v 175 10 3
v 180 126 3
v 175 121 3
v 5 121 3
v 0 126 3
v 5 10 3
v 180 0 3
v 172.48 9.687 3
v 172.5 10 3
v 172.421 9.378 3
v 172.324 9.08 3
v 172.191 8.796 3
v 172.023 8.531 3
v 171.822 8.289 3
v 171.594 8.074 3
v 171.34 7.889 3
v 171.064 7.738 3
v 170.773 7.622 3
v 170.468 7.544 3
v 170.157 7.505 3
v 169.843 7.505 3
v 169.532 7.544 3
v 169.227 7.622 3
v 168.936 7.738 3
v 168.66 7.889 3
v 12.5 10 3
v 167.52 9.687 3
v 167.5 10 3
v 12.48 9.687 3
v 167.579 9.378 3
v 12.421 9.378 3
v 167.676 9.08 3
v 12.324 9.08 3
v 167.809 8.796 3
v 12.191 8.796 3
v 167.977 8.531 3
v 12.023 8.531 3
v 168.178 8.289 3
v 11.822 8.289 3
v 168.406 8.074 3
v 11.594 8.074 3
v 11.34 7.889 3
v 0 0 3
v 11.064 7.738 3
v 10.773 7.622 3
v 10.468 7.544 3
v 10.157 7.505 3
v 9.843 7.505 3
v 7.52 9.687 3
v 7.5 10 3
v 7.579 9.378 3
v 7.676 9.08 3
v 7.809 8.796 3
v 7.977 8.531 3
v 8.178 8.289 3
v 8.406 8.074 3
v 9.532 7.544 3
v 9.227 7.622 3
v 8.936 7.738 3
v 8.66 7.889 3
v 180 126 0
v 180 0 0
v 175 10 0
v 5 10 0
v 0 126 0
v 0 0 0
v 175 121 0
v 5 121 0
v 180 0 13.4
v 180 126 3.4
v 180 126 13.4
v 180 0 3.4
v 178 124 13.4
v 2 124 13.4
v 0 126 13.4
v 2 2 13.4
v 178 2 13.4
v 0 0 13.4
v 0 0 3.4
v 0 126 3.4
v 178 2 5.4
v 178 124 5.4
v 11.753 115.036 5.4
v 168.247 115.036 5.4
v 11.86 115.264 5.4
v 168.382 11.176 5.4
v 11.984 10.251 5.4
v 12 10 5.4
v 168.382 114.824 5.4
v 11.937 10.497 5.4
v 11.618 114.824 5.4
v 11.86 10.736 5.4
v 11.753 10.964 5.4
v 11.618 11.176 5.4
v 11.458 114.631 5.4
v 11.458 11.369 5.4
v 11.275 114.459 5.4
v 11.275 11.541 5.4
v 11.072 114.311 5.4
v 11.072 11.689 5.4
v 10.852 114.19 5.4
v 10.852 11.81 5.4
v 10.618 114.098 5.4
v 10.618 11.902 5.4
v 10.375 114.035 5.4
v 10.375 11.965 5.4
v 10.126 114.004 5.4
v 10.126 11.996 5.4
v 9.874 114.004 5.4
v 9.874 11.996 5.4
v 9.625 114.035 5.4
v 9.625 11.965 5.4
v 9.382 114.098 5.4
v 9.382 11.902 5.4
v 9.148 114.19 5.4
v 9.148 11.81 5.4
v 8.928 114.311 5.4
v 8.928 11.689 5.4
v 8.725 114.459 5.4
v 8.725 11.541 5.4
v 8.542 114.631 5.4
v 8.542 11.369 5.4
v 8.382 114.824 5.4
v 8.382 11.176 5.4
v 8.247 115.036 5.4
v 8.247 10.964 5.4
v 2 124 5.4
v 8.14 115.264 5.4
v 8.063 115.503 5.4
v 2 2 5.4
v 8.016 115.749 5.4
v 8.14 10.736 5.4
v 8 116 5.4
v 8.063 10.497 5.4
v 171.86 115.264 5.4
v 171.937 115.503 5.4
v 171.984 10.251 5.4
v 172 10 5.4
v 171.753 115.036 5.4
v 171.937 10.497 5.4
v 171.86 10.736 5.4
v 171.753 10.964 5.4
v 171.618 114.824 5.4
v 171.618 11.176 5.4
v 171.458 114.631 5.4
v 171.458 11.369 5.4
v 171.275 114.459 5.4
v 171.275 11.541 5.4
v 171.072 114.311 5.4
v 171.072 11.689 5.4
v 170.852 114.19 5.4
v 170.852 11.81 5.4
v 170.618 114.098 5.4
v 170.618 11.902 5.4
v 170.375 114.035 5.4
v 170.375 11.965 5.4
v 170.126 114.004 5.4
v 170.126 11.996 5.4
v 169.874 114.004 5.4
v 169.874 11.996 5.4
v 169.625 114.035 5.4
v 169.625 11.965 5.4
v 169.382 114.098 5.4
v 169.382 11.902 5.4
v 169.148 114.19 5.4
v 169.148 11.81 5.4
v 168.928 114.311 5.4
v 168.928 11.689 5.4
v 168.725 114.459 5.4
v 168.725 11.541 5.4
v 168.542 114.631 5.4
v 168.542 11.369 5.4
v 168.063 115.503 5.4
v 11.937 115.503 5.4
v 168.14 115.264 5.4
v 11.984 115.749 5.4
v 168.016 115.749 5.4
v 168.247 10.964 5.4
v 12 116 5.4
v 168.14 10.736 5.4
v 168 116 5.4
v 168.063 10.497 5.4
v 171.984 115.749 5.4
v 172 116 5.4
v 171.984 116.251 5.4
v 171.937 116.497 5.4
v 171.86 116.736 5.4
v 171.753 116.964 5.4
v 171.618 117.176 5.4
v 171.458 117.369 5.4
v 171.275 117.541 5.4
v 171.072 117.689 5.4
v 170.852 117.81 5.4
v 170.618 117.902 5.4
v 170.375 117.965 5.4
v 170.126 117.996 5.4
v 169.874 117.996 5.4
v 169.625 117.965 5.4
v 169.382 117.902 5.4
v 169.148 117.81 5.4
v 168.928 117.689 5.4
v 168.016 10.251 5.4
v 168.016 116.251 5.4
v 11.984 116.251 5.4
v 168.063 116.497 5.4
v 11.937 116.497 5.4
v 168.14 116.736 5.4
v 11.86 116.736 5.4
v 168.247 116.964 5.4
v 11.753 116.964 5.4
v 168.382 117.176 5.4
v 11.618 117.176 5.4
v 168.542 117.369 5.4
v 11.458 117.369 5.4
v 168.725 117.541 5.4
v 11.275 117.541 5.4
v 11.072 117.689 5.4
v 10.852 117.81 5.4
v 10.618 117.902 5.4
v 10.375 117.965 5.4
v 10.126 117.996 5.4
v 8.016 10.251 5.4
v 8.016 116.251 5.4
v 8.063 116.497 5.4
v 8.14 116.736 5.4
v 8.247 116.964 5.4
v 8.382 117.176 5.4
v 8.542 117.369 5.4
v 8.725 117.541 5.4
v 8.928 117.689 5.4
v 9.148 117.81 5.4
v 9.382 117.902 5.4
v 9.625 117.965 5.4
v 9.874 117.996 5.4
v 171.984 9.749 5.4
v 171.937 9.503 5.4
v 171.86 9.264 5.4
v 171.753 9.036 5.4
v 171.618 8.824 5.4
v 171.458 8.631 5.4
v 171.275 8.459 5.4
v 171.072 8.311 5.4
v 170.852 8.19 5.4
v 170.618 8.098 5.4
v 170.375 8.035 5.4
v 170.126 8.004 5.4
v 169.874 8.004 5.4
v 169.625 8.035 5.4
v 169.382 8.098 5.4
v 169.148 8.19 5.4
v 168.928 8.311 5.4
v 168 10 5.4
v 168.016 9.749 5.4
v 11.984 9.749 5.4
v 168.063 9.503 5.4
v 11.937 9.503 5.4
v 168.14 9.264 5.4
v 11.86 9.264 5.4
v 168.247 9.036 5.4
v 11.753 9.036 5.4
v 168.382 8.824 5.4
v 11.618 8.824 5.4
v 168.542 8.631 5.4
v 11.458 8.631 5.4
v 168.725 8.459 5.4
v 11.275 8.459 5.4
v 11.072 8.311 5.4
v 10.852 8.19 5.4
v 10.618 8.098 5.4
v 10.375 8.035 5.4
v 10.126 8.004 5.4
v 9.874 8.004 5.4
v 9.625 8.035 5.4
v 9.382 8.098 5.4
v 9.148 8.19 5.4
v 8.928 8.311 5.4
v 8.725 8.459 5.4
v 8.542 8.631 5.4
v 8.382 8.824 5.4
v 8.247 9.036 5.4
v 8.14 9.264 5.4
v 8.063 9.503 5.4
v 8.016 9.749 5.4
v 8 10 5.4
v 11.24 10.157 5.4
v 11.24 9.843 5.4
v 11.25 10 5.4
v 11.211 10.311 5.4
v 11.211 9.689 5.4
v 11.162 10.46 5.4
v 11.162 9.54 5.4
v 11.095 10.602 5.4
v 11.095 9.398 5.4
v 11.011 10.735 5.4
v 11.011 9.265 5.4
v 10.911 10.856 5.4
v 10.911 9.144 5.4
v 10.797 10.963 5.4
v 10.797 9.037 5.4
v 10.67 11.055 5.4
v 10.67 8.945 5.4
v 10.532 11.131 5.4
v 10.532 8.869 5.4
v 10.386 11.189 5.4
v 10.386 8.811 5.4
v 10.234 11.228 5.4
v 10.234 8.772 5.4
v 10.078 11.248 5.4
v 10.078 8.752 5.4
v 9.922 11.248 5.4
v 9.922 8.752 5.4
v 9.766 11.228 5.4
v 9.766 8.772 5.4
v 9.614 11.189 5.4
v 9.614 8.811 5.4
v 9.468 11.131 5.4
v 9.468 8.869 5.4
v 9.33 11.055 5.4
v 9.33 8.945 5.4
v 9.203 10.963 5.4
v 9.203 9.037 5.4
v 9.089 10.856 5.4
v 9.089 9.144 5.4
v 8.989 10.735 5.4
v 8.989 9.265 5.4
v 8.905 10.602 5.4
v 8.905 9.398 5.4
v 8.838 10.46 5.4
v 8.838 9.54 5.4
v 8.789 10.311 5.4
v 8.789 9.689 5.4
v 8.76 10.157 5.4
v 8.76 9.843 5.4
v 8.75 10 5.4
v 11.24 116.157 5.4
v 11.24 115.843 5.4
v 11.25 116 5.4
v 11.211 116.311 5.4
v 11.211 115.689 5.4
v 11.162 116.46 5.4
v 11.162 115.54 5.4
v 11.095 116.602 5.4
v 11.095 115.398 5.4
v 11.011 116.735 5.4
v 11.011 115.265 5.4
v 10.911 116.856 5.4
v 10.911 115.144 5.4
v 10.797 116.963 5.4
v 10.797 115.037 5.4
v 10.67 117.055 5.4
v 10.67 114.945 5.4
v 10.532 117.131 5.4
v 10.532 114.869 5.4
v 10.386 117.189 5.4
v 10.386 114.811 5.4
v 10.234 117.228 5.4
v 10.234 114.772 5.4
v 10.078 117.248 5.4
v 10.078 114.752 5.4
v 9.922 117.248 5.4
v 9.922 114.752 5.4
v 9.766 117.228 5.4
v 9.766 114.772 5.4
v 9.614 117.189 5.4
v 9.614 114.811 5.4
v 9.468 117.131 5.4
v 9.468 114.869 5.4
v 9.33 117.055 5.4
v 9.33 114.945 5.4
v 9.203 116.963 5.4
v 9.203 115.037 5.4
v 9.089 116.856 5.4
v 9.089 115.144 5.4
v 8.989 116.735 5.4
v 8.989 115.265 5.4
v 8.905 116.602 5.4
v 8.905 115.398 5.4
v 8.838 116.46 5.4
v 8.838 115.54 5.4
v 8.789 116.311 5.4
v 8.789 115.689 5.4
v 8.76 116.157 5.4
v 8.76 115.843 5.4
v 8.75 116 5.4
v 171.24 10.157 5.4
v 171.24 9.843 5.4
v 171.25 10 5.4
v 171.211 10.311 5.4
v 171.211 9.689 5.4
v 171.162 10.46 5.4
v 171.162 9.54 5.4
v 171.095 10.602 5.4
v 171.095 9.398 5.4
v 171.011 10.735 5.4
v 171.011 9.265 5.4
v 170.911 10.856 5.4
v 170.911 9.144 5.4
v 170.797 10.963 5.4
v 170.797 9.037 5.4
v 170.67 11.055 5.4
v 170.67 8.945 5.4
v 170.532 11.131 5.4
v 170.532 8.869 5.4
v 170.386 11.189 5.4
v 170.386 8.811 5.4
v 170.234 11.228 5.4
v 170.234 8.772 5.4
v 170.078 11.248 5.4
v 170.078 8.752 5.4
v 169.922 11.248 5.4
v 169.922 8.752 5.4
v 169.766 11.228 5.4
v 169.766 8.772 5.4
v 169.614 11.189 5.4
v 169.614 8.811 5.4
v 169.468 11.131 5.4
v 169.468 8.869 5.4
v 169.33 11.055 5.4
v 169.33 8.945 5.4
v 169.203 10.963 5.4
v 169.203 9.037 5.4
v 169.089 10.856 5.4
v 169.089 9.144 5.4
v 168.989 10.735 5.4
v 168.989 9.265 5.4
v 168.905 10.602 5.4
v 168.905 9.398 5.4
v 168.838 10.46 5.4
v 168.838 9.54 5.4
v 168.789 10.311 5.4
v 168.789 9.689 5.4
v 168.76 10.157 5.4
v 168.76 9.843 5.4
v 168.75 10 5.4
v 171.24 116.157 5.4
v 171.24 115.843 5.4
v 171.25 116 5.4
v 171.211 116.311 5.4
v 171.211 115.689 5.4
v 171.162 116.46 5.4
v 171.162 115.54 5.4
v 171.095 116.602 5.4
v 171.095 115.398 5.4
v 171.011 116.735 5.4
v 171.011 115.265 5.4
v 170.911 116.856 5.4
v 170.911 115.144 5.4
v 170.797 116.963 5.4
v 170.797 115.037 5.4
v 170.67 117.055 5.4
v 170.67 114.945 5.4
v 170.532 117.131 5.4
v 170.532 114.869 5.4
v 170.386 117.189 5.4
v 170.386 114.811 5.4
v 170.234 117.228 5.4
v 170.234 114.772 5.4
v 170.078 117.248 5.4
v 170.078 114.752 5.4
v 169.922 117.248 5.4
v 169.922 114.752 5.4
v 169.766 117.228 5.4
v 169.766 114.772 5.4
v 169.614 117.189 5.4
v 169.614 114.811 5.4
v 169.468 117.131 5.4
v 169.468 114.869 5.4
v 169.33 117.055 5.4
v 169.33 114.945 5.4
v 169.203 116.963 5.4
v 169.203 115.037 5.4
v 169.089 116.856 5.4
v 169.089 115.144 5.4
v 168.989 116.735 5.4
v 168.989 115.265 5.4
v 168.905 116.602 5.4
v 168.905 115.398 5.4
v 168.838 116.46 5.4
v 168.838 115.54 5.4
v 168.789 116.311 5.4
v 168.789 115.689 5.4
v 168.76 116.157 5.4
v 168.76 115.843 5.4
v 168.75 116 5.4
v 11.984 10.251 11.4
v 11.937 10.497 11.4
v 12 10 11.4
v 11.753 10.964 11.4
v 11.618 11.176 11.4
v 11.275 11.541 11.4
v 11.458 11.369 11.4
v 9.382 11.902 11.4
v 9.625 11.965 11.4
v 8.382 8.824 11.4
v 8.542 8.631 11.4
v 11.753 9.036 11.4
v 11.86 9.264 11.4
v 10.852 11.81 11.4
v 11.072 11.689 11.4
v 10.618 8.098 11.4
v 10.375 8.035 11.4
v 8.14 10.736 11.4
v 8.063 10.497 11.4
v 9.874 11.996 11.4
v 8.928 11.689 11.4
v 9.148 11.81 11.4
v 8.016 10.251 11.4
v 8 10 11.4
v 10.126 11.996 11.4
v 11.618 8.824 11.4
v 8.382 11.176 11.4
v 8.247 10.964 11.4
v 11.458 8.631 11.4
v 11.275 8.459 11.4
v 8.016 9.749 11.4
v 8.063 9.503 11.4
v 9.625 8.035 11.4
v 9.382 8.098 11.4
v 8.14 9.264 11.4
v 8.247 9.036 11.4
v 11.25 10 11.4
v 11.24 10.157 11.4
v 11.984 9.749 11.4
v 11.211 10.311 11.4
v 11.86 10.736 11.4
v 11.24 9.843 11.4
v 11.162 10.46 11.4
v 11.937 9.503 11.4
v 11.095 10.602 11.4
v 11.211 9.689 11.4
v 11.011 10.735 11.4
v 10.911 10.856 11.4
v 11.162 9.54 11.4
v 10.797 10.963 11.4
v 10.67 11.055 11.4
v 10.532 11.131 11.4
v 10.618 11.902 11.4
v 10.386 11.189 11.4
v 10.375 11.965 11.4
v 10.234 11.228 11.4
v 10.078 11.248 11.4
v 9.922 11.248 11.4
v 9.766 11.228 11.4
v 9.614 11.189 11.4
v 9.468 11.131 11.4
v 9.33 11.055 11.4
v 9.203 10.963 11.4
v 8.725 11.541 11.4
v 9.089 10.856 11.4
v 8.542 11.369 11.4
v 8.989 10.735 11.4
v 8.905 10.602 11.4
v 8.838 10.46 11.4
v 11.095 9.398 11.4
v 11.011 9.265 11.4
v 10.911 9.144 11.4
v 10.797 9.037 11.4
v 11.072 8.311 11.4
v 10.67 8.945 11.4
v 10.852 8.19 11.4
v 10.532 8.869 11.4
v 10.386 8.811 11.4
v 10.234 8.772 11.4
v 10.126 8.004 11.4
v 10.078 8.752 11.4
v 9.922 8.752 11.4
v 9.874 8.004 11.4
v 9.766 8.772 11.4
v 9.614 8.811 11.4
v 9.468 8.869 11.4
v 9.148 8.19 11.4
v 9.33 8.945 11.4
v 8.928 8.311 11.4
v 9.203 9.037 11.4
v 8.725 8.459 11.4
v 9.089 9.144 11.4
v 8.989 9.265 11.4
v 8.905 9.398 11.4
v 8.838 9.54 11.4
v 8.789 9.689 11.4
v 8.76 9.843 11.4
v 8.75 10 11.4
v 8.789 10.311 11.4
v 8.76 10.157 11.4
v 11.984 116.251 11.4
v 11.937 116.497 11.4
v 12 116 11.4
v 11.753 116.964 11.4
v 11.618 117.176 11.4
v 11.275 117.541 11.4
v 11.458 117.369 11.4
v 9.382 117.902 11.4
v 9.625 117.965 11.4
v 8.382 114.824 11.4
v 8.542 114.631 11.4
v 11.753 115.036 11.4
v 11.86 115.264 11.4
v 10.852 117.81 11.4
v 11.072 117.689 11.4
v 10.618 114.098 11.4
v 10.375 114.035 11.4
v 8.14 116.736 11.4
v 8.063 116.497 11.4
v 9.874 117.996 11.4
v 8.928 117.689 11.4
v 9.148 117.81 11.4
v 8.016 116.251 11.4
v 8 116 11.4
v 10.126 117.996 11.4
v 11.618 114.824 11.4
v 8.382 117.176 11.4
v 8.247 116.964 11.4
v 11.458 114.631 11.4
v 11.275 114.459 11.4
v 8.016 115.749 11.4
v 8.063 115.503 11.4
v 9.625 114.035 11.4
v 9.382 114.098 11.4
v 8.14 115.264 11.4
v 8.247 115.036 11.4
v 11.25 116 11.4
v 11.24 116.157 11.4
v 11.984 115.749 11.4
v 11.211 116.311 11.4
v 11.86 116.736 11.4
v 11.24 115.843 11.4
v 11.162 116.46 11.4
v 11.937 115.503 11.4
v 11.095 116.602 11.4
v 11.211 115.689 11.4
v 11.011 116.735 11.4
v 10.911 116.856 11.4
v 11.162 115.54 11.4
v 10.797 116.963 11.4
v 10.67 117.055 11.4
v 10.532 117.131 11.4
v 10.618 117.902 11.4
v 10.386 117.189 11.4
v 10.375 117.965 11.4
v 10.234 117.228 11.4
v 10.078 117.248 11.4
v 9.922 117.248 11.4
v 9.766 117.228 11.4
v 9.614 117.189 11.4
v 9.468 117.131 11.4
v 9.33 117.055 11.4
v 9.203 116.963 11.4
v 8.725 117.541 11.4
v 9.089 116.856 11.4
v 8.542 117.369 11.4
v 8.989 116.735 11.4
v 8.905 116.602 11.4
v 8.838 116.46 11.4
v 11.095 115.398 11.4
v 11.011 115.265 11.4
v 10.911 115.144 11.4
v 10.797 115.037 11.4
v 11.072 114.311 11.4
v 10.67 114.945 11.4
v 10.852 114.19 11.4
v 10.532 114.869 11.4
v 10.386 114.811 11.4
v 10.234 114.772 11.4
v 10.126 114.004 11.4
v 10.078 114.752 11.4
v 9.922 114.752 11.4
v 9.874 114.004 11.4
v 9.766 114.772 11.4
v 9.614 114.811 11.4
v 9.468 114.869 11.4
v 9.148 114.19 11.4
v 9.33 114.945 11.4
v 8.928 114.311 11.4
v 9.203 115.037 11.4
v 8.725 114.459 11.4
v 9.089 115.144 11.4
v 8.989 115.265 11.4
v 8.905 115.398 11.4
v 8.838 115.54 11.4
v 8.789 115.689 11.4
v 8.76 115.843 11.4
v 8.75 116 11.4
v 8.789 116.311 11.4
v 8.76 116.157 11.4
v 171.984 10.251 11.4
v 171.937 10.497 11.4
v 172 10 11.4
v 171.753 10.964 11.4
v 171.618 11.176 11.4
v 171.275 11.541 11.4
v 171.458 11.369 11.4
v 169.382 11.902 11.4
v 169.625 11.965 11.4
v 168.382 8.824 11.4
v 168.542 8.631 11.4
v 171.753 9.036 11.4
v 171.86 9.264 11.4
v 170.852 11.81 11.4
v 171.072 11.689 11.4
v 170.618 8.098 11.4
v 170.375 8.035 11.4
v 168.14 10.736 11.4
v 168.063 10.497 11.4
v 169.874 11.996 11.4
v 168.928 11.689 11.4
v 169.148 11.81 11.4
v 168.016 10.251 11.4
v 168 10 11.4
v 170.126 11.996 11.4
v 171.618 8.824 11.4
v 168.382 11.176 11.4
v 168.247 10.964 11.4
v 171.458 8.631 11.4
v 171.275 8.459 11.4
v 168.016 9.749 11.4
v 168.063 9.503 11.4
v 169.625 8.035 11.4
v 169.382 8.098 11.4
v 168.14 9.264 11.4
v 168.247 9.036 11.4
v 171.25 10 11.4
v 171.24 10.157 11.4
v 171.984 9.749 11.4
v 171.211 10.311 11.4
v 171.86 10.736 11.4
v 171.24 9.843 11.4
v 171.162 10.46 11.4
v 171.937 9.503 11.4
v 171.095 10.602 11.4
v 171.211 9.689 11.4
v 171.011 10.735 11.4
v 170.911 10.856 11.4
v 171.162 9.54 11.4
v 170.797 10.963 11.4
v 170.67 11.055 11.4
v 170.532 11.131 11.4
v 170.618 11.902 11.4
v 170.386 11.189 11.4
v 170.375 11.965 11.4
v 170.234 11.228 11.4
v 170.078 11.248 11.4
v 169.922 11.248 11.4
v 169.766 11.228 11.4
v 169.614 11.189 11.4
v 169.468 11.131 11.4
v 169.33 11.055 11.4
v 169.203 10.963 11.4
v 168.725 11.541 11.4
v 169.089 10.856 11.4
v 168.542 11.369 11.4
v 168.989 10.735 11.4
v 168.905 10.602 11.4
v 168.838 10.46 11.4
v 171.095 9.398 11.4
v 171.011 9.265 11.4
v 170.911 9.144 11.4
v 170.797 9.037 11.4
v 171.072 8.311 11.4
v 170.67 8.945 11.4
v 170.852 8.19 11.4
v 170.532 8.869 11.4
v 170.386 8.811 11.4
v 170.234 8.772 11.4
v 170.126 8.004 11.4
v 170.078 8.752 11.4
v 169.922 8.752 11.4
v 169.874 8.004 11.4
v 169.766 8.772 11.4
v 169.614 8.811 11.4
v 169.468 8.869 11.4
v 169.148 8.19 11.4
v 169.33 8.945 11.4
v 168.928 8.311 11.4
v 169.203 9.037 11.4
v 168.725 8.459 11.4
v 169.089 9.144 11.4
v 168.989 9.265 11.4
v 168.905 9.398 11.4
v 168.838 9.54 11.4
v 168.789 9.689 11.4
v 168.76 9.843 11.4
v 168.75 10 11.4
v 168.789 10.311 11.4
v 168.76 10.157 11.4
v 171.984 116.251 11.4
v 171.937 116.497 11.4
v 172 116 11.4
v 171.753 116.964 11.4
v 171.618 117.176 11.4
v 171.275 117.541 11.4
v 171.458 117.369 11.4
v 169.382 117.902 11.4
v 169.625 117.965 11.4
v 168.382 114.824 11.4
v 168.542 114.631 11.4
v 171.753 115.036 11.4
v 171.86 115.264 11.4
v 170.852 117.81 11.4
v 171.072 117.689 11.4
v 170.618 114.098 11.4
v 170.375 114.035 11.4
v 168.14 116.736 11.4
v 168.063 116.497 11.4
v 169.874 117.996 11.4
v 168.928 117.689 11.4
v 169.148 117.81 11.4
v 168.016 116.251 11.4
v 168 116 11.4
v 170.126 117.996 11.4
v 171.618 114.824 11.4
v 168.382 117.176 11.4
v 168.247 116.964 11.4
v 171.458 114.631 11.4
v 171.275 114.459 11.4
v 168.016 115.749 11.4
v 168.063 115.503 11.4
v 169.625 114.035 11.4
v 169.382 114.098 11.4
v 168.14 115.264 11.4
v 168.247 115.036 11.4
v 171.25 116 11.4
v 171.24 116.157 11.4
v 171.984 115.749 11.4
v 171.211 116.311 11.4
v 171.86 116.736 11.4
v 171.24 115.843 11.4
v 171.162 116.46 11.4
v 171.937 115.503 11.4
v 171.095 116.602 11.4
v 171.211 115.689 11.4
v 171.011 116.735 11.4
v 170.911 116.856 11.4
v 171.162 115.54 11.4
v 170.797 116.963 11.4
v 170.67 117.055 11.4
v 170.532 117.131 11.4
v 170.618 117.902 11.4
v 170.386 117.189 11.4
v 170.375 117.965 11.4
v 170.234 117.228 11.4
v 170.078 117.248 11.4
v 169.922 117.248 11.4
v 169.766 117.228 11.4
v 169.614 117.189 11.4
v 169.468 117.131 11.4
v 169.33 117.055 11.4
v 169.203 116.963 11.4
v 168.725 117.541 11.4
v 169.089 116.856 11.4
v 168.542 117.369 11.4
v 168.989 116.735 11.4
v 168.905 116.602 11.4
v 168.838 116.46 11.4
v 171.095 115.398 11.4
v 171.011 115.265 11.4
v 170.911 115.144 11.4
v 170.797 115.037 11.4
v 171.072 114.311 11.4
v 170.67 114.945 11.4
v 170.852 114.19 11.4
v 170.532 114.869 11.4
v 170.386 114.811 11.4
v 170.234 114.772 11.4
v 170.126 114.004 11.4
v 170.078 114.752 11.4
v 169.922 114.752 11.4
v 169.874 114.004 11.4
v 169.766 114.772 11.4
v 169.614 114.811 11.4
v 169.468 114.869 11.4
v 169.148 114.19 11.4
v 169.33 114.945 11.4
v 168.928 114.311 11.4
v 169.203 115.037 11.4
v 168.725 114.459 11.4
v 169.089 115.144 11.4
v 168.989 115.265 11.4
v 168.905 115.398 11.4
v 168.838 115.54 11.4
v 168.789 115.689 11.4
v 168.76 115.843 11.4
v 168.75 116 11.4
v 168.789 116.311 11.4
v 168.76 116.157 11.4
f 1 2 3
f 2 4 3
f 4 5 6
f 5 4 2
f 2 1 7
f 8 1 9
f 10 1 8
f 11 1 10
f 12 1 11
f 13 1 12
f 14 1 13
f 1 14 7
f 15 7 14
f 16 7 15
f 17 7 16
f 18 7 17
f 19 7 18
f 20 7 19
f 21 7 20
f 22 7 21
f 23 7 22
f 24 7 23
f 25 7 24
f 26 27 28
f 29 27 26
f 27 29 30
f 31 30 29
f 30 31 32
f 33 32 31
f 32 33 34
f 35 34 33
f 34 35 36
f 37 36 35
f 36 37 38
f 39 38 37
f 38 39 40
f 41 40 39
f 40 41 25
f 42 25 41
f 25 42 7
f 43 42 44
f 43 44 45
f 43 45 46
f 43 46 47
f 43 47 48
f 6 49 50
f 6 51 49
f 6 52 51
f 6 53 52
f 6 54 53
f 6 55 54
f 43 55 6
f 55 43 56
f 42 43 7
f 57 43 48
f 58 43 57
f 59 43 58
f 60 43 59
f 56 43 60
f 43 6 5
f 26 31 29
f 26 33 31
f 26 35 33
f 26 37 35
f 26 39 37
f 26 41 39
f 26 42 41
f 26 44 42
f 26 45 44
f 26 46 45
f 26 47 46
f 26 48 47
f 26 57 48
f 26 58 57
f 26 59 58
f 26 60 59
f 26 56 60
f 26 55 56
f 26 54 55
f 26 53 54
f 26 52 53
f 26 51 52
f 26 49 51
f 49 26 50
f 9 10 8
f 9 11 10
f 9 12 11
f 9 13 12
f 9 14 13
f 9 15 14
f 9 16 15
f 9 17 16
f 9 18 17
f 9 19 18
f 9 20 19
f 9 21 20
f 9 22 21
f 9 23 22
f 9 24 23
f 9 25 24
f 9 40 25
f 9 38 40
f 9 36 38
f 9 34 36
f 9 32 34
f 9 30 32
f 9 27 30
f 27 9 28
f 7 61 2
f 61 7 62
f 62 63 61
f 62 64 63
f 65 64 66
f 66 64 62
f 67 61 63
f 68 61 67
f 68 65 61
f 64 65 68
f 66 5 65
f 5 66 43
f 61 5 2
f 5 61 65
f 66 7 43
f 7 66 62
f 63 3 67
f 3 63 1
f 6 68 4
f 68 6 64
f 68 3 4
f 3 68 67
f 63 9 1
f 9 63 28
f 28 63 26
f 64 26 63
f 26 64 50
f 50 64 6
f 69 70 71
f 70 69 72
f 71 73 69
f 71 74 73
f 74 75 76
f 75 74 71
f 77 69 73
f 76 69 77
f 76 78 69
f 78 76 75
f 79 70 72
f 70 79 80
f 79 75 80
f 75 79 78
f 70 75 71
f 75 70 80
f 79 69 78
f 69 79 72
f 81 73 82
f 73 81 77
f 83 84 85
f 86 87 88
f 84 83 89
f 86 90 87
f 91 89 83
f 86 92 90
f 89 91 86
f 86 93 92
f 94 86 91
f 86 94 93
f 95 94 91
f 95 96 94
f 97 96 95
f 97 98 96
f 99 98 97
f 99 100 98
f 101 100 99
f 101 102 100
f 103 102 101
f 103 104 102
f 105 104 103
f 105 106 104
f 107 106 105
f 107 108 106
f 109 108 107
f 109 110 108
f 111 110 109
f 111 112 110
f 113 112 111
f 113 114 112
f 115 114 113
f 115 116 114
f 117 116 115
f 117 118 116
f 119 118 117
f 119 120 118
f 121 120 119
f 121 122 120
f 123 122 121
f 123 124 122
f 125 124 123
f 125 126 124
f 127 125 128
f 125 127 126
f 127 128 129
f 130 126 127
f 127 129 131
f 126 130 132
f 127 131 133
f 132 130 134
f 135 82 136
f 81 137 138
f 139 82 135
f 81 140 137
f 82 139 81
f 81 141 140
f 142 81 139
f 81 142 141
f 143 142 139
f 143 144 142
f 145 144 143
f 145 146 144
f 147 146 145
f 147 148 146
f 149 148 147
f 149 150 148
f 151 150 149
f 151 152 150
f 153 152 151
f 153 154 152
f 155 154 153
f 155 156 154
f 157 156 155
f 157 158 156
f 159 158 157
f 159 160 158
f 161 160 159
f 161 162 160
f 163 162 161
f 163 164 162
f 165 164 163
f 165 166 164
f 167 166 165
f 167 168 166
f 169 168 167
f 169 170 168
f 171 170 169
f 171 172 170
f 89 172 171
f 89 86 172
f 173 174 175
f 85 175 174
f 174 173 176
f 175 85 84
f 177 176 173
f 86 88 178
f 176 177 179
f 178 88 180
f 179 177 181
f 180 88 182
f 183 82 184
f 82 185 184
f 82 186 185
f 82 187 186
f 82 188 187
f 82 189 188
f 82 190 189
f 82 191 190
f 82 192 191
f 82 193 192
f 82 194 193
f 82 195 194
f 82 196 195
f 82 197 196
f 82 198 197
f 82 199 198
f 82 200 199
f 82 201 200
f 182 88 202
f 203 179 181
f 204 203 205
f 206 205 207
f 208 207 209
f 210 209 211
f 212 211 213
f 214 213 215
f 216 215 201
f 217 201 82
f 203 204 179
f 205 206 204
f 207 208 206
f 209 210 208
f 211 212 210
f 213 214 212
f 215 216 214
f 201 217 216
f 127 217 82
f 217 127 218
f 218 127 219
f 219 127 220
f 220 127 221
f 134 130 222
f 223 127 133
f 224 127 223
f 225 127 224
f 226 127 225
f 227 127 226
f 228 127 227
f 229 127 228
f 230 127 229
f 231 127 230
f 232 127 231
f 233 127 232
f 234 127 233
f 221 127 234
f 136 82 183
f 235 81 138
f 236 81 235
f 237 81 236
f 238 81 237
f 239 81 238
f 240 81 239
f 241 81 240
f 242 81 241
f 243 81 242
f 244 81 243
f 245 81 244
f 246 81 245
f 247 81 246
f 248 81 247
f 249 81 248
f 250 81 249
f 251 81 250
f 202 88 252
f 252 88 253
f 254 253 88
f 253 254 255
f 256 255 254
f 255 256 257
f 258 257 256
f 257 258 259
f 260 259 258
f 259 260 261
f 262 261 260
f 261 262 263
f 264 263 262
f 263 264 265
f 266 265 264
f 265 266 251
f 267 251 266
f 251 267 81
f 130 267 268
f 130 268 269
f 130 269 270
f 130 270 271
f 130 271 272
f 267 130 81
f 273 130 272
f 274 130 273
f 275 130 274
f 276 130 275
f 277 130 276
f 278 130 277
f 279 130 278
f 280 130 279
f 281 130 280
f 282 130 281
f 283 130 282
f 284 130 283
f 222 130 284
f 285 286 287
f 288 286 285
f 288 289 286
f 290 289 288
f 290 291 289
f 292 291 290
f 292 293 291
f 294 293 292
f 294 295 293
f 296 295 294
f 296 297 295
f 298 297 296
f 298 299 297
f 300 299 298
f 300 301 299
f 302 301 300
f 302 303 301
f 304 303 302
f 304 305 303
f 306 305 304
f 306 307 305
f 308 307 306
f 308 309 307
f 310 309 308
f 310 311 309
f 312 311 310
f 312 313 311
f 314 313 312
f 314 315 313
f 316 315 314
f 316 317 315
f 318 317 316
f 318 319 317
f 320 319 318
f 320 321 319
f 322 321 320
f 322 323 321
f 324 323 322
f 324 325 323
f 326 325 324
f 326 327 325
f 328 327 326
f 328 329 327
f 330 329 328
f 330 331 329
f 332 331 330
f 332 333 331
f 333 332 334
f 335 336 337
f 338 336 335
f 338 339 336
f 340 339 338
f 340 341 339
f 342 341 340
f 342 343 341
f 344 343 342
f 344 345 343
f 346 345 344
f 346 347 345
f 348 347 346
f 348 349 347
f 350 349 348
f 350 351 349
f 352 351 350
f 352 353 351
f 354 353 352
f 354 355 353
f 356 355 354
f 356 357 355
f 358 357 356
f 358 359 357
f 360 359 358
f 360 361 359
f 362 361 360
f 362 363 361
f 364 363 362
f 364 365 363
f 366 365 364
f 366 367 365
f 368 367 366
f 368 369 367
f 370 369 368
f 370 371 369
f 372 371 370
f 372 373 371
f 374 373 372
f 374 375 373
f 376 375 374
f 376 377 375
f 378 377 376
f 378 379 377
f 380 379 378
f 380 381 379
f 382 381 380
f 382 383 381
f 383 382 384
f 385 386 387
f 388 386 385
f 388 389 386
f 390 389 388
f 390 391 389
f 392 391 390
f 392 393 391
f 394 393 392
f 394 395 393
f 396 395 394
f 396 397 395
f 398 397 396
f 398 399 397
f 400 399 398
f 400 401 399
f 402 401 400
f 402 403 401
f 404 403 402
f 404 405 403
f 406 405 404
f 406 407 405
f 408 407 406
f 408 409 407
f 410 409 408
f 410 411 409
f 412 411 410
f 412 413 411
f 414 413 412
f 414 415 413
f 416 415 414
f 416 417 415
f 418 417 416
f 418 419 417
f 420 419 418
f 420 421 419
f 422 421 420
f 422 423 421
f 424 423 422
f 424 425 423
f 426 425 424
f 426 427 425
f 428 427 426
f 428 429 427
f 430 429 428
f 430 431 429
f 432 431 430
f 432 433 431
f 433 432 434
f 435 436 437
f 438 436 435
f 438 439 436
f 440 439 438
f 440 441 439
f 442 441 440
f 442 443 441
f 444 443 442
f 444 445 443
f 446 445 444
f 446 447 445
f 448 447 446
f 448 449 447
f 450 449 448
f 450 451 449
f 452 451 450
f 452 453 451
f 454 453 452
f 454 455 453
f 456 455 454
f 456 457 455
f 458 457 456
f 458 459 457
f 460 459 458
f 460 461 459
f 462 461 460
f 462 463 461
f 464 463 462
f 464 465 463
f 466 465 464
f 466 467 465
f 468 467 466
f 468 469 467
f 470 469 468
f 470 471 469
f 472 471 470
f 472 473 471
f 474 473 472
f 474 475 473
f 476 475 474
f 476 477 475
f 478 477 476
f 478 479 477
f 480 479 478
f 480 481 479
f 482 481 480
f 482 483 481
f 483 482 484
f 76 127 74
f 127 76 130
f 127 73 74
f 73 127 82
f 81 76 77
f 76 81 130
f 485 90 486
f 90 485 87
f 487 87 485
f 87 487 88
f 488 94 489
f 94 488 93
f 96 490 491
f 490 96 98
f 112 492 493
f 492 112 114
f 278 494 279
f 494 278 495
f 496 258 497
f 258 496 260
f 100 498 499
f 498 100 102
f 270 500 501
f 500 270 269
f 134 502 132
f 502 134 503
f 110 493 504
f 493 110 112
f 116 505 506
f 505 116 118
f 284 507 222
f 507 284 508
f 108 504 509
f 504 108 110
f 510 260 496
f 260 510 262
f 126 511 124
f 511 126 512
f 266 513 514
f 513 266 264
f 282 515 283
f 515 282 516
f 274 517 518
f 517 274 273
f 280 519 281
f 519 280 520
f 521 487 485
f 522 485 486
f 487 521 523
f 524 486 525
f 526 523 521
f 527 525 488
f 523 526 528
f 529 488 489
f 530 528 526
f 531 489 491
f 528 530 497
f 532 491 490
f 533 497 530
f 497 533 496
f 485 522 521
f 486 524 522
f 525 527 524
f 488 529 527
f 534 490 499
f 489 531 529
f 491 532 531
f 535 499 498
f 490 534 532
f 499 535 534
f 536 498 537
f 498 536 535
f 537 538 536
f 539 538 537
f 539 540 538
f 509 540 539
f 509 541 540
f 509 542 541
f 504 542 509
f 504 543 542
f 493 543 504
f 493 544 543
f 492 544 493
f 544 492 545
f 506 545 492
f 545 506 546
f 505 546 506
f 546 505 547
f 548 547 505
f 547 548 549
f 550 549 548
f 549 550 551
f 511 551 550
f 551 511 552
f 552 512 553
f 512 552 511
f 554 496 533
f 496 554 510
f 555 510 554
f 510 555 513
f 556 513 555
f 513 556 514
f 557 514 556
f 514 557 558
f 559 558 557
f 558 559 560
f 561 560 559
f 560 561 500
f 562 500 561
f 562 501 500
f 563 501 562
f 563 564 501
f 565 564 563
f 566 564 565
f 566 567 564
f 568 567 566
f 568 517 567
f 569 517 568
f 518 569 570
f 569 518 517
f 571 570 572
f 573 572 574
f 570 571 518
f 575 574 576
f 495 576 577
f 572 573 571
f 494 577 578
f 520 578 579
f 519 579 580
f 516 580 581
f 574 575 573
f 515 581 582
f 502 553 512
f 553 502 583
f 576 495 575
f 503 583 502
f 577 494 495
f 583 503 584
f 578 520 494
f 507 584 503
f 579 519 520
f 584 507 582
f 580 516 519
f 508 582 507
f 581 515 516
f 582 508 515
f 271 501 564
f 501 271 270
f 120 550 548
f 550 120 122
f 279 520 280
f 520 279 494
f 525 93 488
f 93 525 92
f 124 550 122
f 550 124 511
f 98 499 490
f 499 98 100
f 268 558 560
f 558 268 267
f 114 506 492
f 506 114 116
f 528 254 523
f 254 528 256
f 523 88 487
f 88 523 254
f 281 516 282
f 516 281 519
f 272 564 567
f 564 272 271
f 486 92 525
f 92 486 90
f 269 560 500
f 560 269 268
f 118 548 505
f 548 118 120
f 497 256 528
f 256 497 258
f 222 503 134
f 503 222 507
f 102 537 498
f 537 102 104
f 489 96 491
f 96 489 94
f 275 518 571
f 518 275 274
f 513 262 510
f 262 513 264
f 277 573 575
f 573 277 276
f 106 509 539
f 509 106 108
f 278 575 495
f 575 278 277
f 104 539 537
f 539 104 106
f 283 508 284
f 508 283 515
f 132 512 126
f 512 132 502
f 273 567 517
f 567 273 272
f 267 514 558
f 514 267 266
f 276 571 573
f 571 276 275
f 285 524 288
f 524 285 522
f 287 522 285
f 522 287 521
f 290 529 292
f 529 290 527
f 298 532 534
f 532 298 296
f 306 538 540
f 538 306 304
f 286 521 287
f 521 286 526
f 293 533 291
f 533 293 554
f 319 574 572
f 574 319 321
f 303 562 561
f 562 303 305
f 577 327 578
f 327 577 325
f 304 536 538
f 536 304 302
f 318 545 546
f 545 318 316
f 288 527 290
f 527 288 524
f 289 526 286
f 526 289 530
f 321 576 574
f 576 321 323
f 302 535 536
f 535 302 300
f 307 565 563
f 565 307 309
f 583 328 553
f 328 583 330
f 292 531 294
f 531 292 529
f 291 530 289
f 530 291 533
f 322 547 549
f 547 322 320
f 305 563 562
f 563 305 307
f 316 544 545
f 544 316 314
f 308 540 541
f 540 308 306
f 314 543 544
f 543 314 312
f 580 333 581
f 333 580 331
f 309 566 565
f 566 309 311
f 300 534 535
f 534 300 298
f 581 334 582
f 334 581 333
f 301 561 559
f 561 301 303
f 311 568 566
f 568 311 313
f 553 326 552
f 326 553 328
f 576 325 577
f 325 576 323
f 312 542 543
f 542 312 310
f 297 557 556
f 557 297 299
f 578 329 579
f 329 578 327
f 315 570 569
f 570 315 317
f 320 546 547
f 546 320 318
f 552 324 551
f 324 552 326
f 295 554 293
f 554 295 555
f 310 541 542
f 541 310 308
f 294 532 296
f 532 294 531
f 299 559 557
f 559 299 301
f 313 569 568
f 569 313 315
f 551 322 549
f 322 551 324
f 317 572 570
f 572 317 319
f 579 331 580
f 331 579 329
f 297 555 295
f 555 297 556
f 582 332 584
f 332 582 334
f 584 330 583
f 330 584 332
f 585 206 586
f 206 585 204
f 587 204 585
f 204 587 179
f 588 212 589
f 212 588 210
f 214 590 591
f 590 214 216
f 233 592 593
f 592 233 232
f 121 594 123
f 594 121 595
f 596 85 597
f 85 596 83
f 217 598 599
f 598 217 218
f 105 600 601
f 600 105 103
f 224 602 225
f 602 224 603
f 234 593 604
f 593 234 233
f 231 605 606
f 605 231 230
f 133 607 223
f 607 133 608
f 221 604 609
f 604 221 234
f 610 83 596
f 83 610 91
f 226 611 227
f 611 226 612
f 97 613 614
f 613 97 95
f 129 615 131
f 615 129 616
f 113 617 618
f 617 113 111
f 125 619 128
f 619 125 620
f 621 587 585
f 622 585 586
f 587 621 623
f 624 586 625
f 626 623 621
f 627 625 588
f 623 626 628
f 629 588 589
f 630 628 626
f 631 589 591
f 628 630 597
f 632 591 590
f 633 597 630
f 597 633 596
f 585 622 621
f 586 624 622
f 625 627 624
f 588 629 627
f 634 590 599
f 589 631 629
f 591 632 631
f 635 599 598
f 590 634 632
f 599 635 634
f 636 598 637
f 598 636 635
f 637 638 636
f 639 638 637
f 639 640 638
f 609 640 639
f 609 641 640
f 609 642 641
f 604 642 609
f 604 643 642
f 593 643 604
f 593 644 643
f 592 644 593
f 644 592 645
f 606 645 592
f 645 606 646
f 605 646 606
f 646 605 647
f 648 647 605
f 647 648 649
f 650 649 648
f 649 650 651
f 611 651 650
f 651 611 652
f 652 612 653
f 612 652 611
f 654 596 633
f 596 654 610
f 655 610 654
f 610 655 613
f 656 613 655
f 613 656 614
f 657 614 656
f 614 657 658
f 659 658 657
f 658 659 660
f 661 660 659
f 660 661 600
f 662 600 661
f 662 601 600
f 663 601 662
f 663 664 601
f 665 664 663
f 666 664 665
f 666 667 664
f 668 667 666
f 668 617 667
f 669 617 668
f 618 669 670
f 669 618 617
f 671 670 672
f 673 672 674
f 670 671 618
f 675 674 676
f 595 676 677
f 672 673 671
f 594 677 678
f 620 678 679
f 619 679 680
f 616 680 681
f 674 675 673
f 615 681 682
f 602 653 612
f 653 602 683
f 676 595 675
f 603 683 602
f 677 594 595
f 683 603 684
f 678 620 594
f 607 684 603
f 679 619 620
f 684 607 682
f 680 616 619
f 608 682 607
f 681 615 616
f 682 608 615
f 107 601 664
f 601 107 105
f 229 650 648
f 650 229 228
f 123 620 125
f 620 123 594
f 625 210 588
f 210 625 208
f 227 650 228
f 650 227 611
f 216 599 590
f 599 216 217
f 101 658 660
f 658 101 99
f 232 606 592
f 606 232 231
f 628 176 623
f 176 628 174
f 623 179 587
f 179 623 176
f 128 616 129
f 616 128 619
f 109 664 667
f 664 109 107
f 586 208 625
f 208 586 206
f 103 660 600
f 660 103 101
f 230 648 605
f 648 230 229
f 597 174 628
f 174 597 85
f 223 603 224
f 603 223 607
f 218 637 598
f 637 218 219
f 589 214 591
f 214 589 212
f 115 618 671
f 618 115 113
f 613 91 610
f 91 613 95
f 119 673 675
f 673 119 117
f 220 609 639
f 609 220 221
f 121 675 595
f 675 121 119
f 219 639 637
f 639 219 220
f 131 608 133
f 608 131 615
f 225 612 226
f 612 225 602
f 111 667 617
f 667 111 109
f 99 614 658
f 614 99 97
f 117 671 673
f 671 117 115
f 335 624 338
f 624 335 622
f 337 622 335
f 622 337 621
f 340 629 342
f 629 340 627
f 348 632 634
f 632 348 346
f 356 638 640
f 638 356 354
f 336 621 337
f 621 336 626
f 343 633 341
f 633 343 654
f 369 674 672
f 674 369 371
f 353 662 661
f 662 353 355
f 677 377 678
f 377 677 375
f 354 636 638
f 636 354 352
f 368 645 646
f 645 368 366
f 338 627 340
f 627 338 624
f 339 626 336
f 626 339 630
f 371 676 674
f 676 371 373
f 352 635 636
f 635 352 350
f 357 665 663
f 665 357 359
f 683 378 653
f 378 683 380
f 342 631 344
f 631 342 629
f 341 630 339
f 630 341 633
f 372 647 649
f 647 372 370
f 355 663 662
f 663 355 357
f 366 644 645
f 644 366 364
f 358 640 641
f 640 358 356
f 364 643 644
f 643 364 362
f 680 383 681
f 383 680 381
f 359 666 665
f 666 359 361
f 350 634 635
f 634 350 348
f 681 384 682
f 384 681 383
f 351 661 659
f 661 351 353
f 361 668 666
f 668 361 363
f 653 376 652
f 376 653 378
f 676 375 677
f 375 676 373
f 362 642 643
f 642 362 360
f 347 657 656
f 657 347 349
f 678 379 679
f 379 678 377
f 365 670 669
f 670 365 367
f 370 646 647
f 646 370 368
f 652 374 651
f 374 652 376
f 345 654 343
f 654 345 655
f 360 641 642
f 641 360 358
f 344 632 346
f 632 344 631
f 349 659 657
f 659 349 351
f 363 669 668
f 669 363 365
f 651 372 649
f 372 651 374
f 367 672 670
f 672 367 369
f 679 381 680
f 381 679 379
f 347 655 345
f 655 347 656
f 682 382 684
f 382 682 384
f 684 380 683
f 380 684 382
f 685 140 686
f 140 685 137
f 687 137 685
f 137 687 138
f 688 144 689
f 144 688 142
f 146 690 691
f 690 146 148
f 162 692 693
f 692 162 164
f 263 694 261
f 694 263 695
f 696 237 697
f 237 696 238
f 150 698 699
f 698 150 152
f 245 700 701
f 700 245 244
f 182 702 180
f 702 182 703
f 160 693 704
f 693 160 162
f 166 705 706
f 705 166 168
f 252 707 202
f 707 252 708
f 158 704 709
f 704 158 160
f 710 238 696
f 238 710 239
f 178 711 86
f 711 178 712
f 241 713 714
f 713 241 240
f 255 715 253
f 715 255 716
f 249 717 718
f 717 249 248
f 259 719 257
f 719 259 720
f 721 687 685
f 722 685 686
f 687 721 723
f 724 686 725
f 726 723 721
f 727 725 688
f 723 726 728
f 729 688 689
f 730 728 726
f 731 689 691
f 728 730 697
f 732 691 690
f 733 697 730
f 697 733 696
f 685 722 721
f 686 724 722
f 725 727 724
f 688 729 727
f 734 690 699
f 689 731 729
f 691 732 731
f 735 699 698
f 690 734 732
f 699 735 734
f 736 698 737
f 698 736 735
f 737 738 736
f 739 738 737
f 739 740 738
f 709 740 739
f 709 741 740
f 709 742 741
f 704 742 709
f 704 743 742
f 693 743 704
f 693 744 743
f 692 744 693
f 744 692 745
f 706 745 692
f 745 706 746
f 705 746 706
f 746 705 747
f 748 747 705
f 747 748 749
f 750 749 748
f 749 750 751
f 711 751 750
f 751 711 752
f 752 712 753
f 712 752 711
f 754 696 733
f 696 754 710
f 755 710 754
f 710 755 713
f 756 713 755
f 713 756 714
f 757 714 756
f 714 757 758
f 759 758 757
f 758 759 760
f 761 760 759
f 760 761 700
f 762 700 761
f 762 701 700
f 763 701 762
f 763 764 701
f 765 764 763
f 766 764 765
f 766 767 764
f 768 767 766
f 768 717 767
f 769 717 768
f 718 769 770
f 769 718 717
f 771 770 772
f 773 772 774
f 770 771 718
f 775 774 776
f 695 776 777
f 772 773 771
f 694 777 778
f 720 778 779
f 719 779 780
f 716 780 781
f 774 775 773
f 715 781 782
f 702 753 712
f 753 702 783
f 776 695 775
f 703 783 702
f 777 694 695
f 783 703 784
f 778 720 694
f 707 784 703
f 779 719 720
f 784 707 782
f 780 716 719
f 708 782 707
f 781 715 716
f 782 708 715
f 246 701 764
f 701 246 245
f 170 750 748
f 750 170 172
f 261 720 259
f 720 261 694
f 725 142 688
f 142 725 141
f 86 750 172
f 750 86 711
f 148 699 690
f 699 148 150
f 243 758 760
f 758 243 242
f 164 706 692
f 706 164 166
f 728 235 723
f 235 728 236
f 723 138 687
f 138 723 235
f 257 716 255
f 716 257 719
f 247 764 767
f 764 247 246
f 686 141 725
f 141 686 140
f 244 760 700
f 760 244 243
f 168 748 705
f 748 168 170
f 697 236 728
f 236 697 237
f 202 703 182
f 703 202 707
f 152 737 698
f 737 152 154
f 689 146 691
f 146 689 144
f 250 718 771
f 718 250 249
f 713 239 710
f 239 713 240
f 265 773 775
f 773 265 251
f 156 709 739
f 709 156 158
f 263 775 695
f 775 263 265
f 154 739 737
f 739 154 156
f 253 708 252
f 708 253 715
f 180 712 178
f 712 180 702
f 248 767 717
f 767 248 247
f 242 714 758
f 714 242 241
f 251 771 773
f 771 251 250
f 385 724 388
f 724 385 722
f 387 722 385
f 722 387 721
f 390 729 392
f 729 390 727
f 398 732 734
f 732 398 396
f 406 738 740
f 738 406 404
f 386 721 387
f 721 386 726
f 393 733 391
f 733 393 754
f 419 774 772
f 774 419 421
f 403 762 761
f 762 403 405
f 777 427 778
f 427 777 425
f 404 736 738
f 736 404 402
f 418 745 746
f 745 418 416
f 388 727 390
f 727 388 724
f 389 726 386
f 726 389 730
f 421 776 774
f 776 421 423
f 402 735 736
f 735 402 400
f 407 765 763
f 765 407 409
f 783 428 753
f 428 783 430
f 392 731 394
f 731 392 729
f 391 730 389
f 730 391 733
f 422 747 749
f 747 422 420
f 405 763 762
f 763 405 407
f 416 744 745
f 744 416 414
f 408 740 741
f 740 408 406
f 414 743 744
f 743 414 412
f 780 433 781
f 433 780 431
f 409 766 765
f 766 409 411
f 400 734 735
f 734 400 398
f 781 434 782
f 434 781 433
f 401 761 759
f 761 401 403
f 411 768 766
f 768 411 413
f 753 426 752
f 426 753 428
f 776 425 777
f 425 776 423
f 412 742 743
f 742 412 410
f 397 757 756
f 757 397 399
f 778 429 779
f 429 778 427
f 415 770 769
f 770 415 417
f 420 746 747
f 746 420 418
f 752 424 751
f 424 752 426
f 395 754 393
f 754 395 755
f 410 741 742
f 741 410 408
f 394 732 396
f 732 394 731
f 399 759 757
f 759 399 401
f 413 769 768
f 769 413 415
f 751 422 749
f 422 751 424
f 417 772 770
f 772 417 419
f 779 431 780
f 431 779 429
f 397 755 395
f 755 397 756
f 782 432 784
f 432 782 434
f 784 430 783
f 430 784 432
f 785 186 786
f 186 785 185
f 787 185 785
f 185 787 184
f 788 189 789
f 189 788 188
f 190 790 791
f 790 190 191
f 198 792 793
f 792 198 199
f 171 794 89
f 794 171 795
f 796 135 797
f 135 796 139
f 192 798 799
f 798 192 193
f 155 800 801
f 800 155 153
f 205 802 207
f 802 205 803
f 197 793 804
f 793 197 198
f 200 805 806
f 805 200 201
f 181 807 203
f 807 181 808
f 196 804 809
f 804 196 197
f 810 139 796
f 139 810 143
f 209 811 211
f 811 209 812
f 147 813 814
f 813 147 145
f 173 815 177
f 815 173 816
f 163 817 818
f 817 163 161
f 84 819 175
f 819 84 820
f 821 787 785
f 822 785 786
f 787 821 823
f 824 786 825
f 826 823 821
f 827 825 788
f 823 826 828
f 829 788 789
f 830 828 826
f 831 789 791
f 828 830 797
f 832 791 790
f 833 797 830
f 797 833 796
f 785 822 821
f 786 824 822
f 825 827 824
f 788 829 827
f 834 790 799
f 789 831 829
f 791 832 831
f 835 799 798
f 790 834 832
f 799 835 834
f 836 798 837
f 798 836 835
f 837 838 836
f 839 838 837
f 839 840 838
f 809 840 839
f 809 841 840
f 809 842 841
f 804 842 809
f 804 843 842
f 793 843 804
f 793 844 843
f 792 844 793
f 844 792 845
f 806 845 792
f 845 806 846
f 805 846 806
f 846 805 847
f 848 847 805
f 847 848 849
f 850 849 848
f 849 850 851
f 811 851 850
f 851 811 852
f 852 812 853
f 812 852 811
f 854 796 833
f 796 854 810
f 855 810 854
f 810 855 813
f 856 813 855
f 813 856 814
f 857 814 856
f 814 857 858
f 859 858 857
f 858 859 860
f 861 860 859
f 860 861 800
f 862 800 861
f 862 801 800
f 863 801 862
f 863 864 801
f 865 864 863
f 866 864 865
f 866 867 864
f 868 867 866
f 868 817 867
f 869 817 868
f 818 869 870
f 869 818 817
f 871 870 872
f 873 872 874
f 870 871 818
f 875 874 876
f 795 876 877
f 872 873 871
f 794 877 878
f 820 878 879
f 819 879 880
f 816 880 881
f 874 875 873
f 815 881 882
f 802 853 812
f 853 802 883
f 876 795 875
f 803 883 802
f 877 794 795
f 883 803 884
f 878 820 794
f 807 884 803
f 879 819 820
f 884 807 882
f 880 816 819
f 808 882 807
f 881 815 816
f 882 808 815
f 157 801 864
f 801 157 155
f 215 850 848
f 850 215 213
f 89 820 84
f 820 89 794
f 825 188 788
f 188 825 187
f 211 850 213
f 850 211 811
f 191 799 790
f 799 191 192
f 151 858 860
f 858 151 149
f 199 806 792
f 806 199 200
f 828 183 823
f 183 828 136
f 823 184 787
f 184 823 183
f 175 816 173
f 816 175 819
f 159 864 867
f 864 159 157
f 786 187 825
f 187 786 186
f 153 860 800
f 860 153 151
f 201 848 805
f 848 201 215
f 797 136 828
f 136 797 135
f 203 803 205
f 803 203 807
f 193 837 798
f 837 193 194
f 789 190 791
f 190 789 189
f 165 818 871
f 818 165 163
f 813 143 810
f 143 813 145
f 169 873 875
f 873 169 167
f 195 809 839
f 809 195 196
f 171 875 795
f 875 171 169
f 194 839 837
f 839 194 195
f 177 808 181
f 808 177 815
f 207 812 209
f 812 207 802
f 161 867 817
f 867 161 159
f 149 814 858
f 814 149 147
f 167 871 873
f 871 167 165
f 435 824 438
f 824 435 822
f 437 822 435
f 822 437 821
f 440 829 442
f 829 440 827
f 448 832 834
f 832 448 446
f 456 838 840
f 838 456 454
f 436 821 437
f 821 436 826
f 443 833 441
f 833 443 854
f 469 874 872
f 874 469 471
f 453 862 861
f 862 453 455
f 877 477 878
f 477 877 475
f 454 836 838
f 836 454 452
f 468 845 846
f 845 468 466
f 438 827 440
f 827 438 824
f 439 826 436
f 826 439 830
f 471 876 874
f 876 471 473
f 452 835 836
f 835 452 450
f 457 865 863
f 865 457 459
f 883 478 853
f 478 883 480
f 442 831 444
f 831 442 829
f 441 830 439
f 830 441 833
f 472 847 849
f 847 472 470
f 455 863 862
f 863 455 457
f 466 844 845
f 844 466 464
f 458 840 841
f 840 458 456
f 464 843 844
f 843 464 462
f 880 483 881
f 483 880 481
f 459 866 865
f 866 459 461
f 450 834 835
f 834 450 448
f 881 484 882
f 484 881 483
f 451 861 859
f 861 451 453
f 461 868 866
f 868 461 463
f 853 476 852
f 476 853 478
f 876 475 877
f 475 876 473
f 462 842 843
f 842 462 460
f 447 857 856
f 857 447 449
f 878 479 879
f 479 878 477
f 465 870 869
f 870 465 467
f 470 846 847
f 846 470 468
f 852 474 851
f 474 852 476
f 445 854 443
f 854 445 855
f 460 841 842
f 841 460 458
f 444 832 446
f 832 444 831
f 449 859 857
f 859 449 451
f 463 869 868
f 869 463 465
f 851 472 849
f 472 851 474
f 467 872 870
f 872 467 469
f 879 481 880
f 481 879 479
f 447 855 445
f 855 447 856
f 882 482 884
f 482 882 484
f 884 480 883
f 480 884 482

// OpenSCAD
///////////////////////////////////////////////////////////////////////
//  E-Ink Display Case
//  Parametric Case for 7.3" Waveshare E-Ink & Raspberry Pi Zero W2
//
//  Author: ChatGPT (inspired by snippet provided by @Andy Levesque)
//  License: CC BY-NC
//
//  Description:
//    This OpenSCAD file creates a two- (or three-) part enclosure:
//    1) A front frame that holds and bezel-encapsulates the eInk panel
//    2) A back shell to hold Pi Zero W2 and to secure the panel from behind
//    3) Optionally a middle spacer if you need more depth or want a 3-part approach
//
//  Key features:
//    - Parametric eInk display size (width x height)
//    - Different top/bottom/left/right bezel widths
//    - Extensions for each bezel dimension
//    - Screw standoffs for assembly
//    - Adjust thickness, standoff heights/diameters, etc.
//
//  Usage:
//    1) Tweak parameters below
//    2) Render the entire assembly or generate STLs for each part:
//       - "front_frame()"
//       - "back_shell()"
//       - "middle_spacer()" (optional if you’d like more depth)
//    3) Export each module as STL individually or comment/uncomment
//       to see only the part you want.
//
//  NOTE: If you want to incorporate your original code’s hex walls,
//        slot system, or BOSL2-based features, simply replace the
//        relevant geometry inside the union/difference blocks with
//        your specialized modules.
///////////////////////////////////////////////////////////////////////


// -------------------------------------------------------------------
//                        1) Core Dimensions
// -------------------------------------------------------------------

// 7.3" Waveshare eInk active area ~170 x 111 mm. 
// Adjust to your panel’s outer glass or frame dimensions, if needed.
eInkWidth  = 170;     // mm
eInkHeight = 111;     // mm

// Bezel thickness on each side. By default, 5 mm all around except bottom is 10 mm.
bezelTop    = 5;
bezelBottom = 10;
bezelLeft   = 5;
bezelRight  = 5;

// Optional extension in each direction beyond the bezel. 
// Useful if you want more room for cables or to attach stands, etc.
extendTop    = 0;
extendBottom = 0;
extendLeft   = 0;
extendRight  = 0;

// The front frame thickness and the back shell thickness
frameThickness   = 3;   // how “tall” the front bezel ring is
backShellDepth   = 8;   // interior depth behind the panel for Pi, wires, etc.
shellWallThickness = 2; // thickness of the back shell walls

// If you want a separate "middle spacer" piece to further extend the case:
middleSpacerHeight = 0;  // set > 0 for a 3-part case, set 0 to omit

// -------------------------------------------------------------------
//                      2) Mounting / Screws
// -------------------------------------------------------------------

// Screw standoff settings
standoffDiameter        = 4.0;      // outer diameter of standoff
screwHoleDiameter       = 2.5;      // clearance hole for M2.5 or M3, etc.
standoffHeight          = backShellDepth; 
standoffInsetFromEdges  = 10;       // how far from edges to place standoffs

// The front ring also can have “receptacles” that line up with standoffs
receptacleDepth   = 2;  // how deep the front ring’s countersink for the screw
receptacleDiameter = 5; // slightly bigger than standoffDiameter to hold the head

// Number of standoffs along width/height
standoffCountWidth  = 2;  // how many standoffs left-to-right
standoffCountHeight = 2;  // how many standoffs top-to-bottom

// -------------------------------------------------------------------
//                 3) Calculate Overall Dimensions
// -------------------------------------------------------------------

// The overall opening needed for the eInk panel
panelWidth  = eInkWidth;
panelHeight = eInkHeight;

// The front frame’s total X dimension
totalFrameX = panelWidth
             + bezelLeft + bezelRight
             + extendLeft + extendRight;

// The front frame’s total Y dimension
totalFrameY = panelHeight
             + bezelTop + bezelBottom
             + extendTop + extendBottom;

// The front frame’s outer X dimension == totalFrameX
// The front frame’s outer Y dimension == totalFrameY
// The front frame’s thickness == frameThickness

// If you are doing a 3-part design, total case depth = frameThickness + middleSpacerHeight + backShellDepth + shellWallThickness

// -------------------------------------------------------------------
//              4) Modules for repeated geometry
// -------------------------------------------------------------------

// Create a rounded or standard rectangular cuboid
module box_3d(sizeXYZ=[10,10,10], center=false) {
    // Simple standard box
    if (!center) {
        cube(sizeXYZ, center=false);
    } else {
        cube(sizeXYZ, center=true);
    }
}

// A simple standoff plus a hole for screw
module standoffWithHole(height, standoffDia, holeDia) {
    difference() {
        cylinder(h = height, r = standoffDia/2, $fn=50);
        translate([0,0,-0.1])  // slight shift so hole goes all the way
            cylinder(h = height+0.2, r = holeDia/2, $fn=50);
    }
}

// Discrete function to place standoffs in corners or along edges
module placeStandoffs(standoffHt, standoffDia, holeDia, standoffCntW, standoffCntH) {
    // We’ll distribute them across the “inner rectangle”
    // from standoffInsetFromEdges to (totalFrameX - standoffInsetFromEdges)
    spacingW = (totalFrameX - 2*standoffInsetFromEdges);
    spacingH = (totalFrameY - 2*standoffInsetFromEdges);

    // If standoffCountWidth == 2, we place them at each corner in X
    // If standoffCountWidth > 2, we spread them evenly
    stepW = (standoffCountWidth > 1) 
            ? spacingW / (standoffCountWidth - 1) 
            : 0;
    stepH = (standoffCountHeight > 1)
            ? spacingH / (standoffCountHeight - 1)
            : 0;
    
    for (ix=[0:standoffCountWidth-1]) {
        for (iy=[0:standoffCountHeight-1]) {
            xPos = standoffInsetFromEdges + ix * stepW;
            yPos = standoffInsetFromEdges + iy * stepH;
            // Move standoff into place
            translate([xPos, yPos, 0])
                standoffWithHole(standoffHt, standoffDia, holeDia);
        }
    }
}

// A cutout for the eInk panel region
module eInkCutout() {
    // The panel sits flush inside
    // We remove a rectangle from the front frame. 
    translate([bezelLeft + extendLeft, 
               bezelBottom + extendBottom, 
               0])
        cube([panelWidth, panelHeight, 999], center=false);
}

// -------------------------------------------------------------------
//             5) The Front Frame (Top Part)
// -------------------------------------------------------------------
module front_frame() {
    // This ring is totalFrameX x totalFrameY, thickness = frameThickness
    // With a large rectangular cutout for the display

    difference() {
        // Outer shape of front frame
        box_3d(
            sizeXYZ=[totalFrameX, totalFrameY, frameThickness],
            center=false
        );
        
        // Carve out the display opening
        eInkCutout();

        // OPTIONAL: carve out screw receptacles from the top side
        // We offset standoffs inside the ring, so let’s carve a cylinder 
        // from above for each standoff location. (like countersink)
        // This is only if you want the screw heads to be flush.
        translate([0,0,frameThickness])
        for (ix=[0:standoffCountWidth-1]) {
            for (iy=[0:standoffCountHeight-1]) {
                xPos = standoffInsetFromEdges + ix * ( (totalFrameX - 2*standoffInsetFromEdges)
                          / max(1,(standoffCountWidth-1)) );
                yPos = standoffInsetFromEdges + iy * ( (totalFrameY - 2*standoffInsetFromEdges)
                          / max(1,(standoffCountHeight-1)) );

                // cut from above
                translate([xPos, yPos, 0]) {
                    cylinder(h = receptacleDepth+0.2, r = receptacleDiameter/2, $fn=50);
                }
            }
        }
    }
}

// -------------------------------------------------------------------
//             6) The Middle Spacer (Optional)
// -------------------------------------------------------------------
module middle_spacer() {
    if(middleSpacerHeight > 0) {
        difference() {
            // Outer block
            box_3d(
                sizeXYZ=[totalFrameX, totalFrameY, middleSpacerHeight],
                center=false
            );
            // The same eInkCutout so the interior is open
            eInkCutout();
        }
    }
}

// -------------------------------------------------------------------
//             7) The Back Shell (Bottom Part)
// -------------------------------------------------------------------
module back_shell() {
    // The back shell will be:
    //   totalFrameX x totalFrameY in XY
    //   shellWallThickness + backShellDepth in Z
    //
    // We’ll have a rim around the perimeter (shellWallThickness thick),
    // plus a “floor” at the bottom. Inside is hollow to fit the Pi & wiring.
    //
    // Then we also place standoffs that line up with front frame’s countersink holes.

    // 1) The big outer block
    union() {
        // Outer perimeter walls + floor
        difference() {
            // Outer rectangular prism
            box_3d(
                sizeXYZ=[totalFrameX, totalFrameY, (backShellDepth + shellWallThickness)],
                center=false
            );
            // Hollow out the inside
            translate([shellWallThickness, shellWallThickness, shellWallThickness])
                box_3d(
                    sizeXYZ=[
                        totalFrameX - 2*shellWallThickness,
                        totalFrameY - 2*shellWallThickness,
                        backShellDepth
                    ],
                    center=false
                );
        }

        // 2) Add standoffs inside the shell
        //    If you prefer them on the perimeter, you can adjust positions.
        //    Here, they start at Z=0 (on the floor) and go up standoffHeight.
        translate([0,0,0]) {
            placeStandoffs(standoffHeight, standoffDiameter, screwHoleDiameter, 
                           standoffCountWidth, standoffCountHeight);
        }
    }
}

// -------------------------------------------------------------------
//                 8) Display or Export each part
// -------------------------------------------------------------------
// Uncomment the module you want to preview or export as STL

// a) FRONT FRAME ONLY
//front_frame();

// b) MIDDLE SPACER ONLY (only if middleSpacerHeight > 0)
//middle_spacer();

// c) BACK SHELL ONLY
//back_shell();

// d) WHOLE ASSEMBLY
// For visualization, place them in “assembled” positions:
assemblyGap = 0.2; // small gap so we can see they are separate
translate([0,0,0])                front_frame();
translate([0,0,frameThickness + assemblyGap])   middle_spacer();
translate([0,0,frameThickness + middleSpacerHeight + assemblyGap * 2]) back_shell();
